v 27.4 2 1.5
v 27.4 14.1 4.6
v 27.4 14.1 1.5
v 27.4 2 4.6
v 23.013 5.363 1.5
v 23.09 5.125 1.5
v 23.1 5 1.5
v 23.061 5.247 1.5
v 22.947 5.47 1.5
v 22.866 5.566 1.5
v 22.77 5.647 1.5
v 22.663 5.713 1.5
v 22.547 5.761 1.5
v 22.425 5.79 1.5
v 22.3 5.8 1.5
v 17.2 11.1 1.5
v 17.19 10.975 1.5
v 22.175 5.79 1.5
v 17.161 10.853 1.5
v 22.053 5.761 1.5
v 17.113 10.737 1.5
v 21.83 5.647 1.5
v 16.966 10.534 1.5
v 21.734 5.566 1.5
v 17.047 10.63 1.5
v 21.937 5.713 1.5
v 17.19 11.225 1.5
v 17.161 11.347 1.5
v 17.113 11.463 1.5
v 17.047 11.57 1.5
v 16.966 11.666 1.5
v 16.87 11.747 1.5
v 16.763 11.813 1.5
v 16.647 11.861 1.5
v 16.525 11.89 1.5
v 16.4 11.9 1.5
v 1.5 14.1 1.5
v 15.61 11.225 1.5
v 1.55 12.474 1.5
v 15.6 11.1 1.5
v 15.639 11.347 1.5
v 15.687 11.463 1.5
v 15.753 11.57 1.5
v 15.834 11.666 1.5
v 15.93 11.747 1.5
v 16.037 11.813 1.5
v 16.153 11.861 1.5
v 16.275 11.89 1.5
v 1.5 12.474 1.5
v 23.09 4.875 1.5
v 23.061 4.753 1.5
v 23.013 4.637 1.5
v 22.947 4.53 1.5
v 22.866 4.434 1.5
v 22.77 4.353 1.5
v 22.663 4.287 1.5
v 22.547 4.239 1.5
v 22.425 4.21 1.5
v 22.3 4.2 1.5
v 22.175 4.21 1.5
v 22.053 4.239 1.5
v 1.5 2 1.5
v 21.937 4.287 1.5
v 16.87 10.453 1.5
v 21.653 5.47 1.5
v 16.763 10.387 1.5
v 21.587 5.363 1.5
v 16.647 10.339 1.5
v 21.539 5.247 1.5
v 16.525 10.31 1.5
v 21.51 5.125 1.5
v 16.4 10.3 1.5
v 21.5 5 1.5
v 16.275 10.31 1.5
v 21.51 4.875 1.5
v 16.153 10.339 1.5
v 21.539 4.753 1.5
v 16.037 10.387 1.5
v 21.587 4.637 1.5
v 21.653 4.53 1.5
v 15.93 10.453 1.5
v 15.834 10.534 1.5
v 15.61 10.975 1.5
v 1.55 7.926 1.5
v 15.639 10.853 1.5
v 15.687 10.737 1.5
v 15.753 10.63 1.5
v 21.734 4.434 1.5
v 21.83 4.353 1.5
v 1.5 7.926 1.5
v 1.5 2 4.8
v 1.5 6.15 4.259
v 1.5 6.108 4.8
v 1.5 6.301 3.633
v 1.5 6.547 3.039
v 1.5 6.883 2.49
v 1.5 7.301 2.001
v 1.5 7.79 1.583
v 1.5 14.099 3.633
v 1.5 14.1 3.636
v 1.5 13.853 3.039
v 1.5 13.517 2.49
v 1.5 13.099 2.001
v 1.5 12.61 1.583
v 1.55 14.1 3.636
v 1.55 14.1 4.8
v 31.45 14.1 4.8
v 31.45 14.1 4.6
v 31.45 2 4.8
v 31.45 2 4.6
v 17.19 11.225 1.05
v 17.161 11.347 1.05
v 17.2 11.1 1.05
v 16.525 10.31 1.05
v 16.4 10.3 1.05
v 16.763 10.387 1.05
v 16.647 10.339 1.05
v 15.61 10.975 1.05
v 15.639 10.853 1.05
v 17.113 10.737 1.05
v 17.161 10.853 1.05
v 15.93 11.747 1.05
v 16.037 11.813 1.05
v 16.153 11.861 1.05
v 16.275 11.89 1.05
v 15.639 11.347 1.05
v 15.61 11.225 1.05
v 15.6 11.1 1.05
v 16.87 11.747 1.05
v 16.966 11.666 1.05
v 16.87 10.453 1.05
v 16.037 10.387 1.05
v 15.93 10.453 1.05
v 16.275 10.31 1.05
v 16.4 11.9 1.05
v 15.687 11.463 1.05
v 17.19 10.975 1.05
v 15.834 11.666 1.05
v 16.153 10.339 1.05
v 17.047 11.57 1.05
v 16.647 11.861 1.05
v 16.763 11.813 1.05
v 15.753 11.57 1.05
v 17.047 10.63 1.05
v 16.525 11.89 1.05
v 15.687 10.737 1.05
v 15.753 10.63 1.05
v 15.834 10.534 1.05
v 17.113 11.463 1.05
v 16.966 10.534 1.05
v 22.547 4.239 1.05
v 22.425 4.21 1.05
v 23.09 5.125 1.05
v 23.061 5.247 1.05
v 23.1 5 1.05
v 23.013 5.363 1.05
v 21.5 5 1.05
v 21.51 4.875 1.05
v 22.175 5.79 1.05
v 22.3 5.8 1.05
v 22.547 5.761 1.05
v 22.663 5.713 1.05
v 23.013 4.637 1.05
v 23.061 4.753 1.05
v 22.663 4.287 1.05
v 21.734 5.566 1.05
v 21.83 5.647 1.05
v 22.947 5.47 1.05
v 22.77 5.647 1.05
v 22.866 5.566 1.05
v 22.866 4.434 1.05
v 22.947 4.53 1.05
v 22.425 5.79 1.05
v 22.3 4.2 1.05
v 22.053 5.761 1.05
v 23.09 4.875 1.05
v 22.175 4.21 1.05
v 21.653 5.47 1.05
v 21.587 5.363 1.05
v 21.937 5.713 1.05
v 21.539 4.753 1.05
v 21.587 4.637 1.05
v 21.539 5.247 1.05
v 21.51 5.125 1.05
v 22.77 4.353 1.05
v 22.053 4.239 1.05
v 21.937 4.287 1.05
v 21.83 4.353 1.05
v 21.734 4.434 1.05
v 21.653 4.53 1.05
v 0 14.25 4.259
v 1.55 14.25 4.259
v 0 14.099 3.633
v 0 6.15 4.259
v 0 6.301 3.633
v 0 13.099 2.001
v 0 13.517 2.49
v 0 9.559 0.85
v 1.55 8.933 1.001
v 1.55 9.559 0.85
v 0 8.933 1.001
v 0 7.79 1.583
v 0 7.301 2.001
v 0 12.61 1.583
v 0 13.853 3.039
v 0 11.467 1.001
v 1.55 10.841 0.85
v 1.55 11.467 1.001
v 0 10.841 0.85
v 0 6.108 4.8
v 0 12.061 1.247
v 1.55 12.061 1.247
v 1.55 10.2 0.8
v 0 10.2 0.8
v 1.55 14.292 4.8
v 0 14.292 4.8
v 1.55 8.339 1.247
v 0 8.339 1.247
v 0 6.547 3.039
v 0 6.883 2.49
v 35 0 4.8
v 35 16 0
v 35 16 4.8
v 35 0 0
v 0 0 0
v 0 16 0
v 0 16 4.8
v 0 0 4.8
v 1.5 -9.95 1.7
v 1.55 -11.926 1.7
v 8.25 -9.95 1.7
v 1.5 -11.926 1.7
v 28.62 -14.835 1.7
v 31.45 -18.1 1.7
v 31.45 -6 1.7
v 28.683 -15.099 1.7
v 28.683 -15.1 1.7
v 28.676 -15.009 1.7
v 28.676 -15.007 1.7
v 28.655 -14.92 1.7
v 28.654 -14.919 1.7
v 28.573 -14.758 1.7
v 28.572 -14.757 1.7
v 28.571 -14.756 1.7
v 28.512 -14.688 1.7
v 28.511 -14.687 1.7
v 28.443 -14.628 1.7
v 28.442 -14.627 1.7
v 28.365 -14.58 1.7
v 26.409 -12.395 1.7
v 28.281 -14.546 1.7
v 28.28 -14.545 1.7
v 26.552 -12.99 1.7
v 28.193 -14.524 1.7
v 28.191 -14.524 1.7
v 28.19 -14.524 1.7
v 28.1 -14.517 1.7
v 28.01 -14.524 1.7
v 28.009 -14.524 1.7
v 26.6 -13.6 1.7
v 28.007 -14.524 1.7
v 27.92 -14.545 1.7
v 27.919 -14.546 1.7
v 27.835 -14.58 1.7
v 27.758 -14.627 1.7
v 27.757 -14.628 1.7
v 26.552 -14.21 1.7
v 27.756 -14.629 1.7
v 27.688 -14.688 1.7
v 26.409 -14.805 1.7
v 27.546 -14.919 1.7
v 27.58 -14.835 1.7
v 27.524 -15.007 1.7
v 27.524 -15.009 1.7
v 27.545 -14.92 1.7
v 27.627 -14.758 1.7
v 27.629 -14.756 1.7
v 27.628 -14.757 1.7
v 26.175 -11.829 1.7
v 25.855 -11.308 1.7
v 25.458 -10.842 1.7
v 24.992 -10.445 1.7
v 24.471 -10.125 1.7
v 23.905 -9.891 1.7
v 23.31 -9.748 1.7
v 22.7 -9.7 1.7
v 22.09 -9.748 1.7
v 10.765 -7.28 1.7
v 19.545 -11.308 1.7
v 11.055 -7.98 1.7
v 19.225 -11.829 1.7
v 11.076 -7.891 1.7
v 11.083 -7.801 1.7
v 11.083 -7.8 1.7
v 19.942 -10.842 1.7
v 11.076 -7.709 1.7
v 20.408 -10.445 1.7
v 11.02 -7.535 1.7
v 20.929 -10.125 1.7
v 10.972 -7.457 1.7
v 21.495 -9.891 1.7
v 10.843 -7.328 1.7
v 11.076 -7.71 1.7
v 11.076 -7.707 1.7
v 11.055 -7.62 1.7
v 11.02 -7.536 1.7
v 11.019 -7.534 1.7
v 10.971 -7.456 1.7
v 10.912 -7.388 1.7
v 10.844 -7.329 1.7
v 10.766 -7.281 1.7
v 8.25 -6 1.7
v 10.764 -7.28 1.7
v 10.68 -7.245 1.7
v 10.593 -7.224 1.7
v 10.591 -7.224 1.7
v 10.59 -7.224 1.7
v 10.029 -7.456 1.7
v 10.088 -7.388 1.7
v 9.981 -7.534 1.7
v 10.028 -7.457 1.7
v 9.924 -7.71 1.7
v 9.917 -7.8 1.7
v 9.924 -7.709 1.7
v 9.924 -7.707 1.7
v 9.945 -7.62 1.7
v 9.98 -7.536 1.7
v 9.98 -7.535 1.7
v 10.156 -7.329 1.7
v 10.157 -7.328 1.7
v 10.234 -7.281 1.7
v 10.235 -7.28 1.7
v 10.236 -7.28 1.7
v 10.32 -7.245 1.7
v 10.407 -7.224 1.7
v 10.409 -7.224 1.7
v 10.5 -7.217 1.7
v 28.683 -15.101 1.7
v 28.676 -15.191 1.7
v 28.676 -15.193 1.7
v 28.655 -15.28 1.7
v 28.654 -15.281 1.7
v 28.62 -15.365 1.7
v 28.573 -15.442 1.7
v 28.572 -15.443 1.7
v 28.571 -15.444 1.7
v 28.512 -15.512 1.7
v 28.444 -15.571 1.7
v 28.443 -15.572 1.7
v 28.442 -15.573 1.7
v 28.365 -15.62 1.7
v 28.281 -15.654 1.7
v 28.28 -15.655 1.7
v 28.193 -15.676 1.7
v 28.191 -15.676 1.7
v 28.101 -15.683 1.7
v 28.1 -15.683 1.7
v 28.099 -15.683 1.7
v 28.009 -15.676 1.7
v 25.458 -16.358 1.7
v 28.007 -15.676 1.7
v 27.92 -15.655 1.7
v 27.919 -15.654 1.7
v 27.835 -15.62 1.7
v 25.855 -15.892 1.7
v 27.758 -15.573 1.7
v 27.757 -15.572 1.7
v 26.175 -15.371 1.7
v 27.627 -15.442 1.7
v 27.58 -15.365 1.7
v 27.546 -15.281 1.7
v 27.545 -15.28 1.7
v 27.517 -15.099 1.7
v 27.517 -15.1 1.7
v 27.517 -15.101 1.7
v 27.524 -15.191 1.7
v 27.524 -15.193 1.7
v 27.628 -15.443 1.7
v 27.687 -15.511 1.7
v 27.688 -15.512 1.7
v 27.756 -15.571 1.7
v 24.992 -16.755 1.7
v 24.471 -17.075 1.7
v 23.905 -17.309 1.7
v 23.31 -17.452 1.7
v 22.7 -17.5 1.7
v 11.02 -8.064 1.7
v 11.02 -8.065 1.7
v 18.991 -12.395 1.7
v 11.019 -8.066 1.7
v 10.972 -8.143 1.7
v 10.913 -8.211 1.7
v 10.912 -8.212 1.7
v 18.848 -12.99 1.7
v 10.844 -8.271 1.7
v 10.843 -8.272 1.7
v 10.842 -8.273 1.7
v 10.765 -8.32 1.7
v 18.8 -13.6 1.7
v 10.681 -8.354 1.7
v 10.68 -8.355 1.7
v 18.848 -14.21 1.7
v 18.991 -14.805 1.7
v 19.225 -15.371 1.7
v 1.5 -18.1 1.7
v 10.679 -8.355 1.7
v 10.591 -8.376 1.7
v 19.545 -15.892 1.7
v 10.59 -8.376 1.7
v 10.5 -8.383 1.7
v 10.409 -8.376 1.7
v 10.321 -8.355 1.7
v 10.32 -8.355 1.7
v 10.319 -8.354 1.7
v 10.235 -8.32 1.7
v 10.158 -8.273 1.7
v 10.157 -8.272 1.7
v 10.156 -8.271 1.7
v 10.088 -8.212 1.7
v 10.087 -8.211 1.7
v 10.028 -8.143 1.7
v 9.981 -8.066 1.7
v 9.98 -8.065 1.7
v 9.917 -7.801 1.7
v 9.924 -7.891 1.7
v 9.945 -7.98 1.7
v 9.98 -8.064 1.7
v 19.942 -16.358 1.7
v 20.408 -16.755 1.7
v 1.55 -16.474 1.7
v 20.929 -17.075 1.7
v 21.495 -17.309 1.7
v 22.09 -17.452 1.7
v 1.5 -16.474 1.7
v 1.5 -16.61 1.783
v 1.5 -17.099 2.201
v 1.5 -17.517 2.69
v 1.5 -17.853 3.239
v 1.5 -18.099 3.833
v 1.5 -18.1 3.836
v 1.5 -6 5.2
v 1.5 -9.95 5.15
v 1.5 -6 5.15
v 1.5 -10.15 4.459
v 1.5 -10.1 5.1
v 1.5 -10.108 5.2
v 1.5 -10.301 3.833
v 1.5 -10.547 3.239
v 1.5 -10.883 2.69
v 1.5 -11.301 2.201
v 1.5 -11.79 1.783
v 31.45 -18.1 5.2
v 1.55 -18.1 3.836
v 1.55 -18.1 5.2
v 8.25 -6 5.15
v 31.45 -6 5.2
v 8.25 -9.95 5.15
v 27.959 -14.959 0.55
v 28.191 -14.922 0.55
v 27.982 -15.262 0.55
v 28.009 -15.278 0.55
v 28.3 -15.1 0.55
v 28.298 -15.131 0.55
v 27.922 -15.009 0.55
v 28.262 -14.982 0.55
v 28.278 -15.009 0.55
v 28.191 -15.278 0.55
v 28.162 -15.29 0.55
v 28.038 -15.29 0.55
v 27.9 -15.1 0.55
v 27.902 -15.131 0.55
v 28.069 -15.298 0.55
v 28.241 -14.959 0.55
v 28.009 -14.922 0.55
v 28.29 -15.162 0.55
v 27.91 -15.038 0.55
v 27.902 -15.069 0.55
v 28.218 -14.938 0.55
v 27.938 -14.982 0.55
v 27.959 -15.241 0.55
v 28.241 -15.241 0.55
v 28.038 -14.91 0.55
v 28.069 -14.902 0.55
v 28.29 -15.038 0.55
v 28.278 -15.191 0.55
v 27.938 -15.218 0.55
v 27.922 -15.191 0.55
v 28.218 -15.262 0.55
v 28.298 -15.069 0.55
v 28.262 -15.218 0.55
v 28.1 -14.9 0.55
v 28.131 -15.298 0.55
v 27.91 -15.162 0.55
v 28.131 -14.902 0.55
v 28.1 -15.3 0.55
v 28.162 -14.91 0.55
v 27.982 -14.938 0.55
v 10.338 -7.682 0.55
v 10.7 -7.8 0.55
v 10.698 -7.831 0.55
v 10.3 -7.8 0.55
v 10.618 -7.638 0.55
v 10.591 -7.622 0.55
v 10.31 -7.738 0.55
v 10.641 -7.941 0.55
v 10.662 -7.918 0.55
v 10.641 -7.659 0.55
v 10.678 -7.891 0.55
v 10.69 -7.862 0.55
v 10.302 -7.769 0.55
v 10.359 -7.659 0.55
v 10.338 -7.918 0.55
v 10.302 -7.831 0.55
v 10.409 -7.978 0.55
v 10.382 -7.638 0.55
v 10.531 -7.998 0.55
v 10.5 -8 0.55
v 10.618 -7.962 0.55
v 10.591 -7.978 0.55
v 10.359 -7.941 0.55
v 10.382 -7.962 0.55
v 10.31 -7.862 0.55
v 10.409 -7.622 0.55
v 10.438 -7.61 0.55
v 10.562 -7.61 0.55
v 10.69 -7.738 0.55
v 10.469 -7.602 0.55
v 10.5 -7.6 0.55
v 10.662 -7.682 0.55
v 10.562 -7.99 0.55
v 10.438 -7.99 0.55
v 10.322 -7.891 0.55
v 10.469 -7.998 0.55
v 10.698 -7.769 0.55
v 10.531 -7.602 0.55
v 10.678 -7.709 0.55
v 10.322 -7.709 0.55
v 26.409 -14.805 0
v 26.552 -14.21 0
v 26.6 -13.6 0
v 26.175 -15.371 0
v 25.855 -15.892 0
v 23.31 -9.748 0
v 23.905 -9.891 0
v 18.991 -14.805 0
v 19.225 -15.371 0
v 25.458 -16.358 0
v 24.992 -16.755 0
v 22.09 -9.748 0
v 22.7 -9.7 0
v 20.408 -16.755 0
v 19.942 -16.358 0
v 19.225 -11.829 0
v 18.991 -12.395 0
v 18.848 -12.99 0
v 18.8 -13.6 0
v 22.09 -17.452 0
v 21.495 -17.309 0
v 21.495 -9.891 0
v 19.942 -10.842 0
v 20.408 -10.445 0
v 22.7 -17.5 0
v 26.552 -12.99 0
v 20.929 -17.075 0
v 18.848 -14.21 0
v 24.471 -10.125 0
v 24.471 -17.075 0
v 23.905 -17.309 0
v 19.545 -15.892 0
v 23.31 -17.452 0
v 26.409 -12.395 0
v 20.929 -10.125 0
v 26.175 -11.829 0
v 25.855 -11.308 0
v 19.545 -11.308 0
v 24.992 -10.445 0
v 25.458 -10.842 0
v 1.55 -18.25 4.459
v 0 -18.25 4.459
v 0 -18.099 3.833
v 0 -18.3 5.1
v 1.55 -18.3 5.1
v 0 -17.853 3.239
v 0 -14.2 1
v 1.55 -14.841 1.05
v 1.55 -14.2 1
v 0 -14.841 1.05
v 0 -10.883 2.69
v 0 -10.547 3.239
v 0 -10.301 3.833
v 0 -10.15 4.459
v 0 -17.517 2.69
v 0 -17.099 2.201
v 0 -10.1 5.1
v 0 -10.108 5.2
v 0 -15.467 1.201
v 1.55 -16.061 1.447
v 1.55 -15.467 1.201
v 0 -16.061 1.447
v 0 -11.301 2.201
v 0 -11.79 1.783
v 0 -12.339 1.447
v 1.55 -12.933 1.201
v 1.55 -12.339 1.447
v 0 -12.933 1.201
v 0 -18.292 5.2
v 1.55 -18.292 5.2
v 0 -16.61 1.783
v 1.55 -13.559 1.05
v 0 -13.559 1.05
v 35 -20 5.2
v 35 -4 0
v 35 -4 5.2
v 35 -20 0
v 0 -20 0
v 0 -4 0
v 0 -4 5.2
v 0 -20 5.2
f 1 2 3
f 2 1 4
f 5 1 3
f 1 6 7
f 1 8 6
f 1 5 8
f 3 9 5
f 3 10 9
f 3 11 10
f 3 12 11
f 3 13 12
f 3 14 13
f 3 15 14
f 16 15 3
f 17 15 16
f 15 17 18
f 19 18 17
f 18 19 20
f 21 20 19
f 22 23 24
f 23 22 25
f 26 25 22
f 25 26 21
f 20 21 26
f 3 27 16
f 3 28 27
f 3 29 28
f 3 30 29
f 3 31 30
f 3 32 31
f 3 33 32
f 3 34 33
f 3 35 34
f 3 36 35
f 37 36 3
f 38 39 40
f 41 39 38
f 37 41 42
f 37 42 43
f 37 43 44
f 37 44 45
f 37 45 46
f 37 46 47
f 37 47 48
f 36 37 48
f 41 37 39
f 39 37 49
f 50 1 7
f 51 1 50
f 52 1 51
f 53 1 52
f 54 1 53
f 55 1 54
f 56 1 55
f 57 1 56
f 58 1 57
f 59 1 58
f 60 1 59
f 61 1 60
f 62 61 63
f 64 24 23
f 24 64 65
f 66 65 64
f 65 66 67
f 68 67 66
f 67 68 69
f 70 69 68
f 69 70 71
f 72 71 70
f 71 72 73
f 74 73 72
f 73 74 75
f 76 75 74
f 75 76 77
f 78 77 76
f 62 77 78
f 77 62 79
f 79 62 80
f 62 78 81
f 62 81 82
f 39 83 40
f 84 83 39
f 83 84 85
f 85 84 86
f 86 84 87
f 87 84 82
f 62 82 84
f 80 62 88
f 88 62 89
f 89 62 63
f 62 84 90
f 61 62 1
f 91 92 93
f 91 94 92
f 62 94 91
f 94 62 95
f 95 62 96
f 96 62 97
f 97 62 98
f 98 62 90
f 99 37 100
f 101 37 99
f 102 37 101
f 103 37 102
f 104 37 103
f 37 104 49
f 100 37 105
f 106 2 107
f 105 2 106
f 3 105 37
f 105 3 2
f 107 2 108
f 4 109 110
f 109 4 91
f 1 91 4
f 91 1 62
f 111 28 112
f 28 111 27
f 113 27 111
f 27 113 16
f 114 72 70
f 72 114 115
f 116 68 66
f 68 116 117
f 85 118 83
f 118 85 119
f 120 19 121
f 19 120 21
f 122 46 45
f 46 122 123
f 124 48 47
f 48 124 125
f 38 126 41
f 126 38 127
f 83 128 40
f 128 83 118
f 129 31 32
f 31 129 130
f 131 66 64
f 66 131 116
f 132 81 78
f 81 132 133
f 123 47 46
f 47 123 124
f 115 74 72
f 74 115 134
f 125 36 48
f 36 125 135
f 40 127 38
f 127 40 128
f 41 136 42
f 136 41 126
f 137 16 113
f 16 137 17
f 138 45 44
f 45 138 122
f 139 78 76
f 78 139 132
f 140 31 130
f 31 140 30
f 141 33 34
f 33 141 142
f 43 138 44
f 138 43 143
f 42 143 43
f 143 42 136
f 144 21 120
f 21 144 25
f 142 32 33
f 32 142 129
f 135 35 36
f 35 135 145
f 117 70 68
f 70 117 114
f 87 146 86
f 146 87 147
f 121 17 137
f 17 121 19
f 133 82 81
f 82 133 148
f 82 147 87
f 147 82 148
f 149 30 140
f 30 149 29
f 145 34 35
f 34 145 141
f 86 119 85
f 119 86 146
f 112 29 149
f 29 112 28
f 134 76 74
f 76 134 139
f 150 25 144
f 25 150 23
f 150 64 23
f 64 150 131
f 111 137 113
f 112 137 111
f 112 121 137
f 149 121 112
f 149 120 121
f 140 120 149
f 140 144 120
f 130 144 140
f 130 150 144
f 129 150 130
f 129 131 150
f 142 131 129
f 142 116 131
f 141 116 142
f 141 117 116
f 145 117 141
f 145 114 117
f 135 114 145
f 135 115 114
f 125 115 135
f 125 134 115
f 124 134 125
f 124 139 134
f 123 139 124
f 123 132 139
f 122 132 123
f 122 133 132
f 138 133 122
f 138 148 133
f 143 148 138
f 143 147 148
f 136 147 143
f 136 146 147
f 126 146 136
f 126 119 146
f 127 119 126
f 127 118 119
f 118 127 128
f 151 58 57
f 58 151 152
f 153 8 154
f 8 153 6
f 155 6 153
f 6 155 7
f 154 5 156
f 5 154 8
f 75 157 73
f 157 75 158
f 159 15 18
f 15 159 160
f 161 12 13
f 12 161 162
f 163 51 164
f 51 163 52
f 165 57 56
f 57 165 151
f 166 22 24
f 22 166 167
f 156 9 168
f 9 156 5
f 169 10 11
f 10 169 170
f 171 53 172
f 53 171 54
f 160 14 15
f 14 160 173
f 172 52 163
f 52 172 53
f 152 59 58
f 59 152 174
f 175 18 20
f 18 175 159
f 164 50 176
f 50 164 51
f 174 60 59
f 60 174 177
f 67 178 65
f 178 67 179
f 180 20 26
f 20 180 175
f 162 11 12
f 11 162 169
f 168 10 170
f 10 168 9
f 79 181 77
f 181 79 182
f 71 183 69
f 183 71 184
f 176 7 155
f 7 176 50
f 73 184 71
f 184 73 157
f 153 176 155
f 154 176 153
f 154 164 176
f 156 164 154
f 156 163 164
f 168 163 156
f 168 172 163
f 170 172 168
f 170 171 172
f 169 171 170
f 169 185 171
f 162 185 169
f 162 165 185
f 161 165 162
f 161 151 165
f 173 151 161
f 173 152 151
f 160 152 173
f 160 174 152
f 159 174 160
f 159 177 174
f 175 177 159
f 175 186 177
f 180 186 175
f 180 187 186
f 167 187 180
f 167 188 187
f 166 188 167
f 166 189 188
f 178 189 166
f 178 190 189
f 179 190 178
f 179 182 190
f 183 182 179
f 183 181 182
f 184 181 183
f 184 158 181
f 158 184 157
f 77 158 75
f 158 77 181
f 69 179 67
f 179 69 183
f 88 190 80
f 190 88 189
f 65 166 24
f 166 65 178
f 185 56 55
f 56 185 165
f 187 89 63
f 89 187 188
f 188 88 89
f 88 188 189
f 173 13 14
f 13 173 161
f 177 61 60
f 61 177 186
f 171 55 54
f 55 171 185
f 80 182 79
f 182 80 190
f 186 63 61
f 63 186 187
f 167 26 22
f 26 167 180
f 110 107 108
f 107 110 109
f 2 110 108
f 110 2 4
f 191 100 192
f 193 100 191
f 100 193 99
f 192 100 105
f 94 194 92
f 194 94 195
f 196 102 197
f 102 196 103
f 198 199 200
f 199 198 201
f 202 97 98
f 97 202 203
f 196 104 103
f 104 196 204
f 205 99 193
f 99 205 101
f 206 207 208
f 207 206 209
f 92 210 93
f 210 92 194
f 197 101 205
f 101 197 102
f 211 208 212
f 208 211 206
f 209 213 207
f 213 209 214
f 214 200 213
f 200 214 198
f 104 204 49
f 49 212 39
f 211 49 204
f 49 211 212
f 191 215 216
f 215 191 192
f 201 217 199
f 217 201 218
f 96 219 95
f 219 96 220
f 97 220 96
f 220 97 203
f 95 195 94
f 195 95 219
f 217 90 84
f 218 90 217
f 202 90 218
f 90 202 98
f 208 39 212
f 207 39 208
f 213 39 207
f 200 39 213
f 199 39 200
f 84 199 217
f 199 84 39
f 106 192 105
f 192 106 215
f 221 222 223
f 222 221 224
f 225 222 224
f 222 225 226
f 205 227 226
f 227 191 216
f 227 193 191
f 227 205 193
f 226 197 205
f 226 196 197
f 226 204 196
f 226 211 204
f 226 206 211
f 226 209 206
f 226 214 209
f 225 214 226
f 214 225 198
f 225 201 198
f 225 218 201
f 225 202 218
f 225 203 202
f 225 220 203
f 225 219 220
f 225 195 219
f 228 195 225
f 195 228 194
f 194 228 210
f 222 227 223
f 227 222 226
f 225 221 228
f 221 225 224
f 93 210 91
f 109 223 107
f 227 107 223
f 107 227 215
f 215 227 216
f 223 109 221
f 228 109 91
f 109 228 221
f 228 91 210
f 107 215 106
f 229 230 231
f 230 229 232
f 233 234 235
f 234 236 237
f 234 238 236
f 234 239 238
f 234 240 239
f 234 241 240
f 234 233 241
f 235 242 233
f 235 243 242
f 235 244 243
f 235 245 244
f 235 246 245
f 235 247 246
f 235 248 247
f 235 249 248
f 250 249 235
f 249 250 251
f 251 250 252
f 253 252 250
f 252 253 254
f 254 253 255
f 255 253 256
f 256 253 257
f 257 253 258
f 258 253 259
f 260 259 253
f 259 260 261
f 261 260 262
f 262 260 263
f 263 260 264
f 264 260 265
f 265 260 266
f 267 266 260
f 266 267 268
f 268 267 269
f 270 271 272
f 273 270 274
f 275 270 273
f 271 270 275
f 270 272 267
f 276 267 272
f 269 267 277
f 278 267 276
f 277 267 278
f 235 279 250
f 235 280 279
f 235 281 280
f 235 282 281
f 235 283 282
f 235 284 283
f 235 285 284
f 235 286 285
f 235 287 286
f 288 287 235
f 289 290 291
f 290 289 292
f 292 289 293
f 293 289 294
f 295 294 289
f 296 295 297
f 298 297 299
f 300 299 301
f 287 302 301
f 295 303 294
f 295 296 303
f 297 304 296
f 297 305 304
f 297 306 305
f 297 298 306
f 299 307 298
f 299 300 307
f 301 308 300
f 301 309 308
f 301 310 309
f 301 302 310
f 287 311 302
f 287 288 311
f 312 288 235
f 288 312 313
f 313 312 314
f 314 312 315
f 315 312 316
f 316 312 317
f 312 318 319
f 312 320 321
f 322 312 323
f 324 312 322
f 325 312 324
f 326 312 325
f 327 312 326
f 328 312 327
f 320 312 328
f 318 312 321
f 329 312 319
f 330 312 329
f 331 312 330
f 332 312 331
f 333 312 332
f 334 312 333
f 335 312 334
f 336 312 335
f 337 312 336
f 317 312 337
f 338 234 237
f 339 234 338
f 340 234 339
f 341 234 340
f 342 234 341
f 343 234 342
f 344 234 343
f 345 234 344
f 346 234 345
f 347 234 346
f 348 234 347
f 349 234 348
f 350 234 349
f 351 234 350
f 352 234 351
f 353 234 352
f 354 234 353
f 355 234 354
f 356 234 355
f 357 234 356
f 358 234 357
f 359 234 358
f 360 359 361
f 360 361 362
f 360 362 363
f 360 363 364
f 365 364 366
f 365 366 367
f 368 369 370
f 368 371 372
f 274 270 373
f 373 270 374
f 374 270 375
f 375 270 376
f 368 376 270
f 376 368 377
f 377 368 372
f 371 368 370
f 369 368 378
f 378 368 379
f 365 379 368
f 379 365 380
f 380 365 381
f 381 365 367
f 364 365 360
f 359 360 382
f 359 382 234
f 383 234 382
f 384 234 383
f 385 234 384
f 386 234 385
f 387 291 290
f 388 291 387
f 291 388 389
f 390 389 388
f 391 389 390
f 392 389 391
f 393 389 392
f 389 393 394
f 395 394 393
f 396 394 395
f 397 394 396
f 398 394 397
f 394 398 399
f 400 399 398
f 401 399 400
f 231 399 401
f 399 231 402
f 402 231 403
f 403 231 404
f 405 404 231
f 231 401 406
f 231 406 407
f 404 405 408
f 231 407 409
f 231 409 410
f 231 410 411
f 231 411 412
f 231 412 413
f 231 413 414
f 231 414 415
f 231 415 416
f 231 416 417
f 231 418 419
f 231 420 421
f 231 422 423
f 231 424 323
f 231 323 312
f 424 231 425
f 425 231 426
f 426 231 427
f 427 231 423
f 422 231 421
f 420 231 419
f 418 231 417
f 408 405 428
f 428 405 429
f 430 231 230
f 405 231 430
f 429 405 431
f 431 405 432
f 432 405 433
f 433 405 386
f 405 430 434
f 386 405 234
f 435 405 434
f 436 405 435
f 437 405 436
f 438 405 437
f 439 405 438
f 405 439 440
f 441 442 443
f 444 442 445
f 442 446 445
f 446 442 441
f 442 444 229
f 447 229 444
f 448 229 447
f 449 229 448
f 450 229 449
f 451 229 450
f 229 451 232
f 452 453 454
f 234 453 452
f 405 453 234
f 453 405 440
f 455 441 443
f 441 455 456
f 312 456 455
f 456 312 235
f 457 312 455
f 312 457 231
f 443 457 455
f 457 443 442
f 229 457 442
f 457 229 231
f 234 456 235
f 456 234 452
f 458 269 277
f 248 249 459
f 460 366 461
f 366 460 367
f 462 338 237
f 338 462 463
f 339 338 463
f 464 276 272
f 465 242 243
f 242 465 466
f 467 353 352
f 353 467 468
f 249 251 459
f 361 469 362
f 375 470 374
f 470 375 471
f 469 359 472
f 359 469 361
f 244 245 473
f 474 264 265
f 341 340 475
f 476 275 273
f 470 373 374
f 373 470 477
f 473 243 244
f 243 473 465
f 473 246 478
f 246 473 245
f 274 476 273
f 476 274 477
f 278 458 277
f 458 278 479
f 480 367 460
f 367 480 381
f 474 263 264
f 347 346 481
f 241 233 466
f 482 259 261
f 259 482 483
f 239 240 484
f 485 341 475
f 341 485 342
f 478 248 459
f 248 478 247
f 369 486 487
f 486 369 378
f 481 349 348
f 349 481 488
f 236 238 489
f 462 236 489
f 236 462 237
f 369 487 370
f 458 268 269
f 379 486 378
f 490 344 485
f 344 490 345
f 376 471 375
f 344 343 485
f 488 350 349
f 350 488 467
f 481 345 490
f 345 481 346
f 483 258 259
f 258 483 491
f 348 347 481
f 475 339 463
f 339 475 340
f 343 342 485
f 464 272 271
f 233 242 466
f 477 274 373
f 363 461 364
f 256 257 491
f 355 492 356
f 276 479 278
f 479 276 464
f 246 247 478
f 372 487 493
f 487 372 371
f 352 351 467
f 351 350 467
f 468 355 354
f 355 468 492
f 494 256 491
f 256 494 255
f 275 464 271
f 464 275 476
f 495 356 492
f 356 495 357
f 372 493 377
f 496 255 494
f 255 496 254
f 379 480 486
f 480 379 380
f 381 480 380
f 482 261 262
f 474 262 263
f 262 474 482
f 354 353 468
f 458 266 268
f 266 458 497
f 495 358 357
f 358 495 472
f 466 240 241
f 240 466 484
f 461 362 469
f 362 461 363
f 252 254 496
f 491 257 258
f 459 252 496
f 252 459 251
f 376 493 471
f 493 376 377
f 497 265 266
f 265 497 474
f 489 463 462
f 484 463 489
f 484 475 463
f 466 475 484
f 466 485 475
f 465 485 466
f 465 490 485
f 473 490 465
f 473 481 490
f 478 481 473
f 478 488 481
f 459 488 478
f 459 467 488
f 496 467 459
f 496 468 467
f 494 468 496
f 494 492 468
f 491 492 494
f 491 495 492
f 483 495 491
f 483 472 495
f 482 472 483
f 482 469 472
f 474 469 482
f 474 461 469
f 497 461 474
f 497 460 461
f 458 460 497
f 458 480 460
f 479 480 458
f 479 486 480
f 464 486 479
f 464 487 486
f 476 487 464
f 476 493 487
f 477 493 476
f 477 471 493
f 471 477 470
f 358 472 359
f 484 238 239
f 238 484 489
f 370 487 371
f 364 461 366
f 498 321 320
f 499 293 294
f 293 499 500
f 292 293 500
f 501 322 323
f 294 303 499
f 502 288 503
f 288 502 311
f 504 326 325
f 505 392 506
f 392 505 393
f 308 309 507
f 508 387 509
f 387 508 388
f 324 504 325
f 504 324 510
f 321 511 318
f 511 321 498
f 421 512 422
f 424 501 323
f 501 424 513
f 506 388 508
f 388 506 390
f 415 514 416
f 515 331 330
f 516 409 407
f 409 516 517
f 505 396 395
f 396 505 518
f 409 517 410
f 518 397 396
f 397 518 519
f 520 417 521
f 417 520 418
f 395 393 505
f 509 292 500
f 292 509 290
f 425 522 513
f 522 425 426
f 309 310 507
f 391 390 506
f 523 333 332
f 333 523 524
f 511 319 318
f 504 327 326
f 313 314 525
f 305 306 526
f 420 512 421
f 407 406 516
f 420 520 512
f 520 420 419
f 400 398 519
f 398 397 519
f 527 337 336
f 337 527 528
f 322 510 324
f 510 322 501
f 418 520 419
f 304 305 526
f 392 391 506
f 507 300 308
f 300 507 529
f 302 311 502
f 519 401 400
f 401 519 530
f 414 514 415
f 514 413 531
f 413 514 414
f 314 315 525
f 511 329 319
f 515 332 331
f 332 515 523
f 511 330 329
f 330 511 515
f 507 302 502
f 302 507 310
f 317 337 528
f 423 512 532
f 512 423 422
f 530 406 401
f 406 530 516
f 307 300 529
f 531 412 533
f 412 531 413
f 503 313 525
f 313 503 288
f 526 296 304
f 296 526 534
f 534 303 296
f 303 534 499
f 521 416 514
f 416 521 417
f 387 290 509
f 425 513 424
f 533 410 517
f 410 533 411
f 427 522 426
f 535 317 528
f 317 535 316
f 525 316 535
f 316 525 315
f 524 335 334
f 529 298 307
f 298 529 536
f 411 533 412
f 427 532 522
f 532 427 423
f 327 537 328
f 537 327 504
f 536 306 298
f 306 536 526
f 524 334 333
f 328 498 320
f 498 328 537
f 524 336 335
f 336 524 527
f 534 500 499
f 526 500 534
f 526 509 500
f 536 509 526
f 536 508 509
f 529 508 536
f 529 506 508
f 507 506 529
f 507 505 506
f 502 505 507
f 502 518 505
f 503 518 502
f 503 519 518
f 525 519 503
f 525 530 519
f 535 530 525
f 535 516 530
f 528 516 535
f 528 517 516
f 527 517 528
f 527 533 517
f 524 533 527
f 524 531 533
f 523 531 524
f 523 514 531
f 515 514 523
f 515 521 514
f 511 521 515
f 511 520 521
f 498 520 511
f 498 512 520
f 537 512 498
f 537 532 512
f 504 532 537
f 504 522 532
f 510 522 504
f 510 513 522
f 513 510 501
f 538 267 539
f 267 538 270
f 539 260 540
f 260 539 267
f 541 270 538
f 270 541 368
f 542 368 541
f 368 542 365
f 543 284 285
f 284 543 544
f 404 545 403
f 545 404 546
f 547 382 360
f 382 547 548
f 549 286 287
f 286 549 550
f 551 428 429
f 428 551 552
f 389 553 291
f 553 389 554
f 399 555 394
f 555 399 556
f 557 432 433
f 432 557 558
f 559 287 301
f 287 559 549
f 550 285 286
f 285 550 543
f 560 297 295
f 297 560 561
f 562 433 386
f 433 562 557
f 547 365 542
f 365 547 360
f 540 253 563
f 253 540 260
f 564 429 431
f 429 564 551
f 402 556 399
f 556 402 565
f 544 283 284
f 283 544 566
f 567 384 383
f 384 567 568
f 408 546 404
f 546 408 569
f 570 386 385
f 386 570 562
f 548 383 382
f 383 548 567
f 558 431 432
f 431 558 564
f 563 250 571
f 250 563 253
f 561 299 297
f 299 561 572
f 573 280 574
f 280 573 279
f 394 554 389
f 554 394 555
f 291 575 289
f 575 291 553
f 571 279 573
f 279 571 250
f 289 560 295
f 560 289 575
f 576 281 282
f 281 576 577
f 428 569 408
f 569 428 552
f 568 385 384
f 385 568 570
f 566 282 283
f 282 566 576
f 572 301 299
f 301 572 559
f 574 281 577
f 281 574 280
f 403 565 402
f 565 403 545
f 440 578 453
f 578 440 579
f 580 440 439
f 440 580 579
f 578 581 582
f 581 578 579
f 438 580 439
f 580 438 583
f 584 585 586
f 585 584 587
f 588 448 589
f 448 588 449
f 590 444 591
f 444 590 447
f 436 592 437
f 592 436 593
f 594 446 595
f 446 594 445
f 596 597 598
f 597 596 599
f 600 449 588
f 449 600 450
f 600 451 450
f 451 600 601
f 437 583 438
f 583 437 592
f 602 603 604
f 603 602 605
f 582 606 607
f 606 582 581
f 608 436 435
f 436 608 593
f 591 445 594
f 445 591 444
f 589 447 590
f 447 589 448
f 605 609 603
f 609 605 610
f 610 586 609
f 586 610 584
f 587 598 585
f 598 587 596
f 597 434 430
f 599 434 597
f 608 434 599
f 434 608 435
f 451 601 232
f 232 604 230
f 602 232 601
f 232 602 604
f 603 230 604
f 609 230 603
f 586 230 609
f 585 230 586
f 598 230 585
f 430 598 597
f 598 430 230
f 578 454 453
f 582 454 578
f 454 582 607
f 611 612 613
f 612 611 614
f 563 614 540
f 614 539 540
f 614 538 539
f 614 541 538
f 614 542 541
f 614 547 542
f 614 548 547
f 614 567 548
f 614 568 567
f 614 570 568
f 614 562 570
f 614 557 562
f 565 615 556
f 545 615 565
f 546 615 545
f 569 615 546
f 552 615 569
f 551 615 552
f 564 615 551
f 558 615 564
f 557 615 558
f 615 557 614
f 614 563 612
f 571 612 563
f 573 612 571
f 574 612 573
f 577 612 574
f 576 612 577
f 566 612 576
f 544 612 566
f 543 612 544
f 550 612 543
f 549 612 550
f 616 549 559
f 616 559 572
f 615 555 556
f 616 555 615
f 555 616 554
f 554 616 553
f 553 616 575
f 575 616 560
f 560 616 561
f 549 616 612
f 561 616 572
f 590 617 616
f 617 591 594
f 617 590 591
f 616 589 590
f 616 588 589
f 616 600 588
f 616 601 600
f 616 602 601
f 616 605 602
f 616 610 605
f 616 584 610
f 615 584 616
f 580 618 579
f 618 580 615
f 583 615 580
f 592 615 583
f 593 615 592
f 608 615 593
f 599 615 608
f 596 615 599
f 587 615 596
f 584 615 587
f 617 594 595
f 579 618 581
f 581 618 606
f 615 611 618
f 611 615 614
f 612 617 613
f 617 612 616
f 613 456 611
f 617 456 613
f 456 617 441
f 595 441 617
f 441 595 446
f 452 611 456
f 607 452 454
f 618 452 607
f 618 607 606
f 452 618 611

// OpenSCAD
// TODO screw holes if wanted




// a tray where the hole made of the motor in 2 parts
exampleHoleTray();
//example that shows the motor inside an cube
//exampleMotorInCube();




module exampleHoleTray(){
	difference(){
		cube([35 , 16, 12]);
		translate([1.5,2,1.5]){
			miniMotor();
		}
		translate([-0.5,-0.5,4.8]){
			cube([40 , 17, 13]);
   	}
	}
	translate([0,-4,10])rotate([180,0,0]){
		difference(){
			cube([35 , 16, 10]);
			translate([1.5,2,1.5]){
				miniMotor();
			}
			translate([-0.5,-0.5,-8.2]){
				cube([40 , 17, 13]);
  	 		}
		}
	}
}

module exampleMotorInCube(){
	%cube([35 , 16, 12]);
	translate([1.5,2,1.5]){
			miniMotor(showMotorPart = true);
	}
	translate([0,-4,10])rotate([180,0,0]){
		%cube([35 , 16, 10]);
			translate([1.5,2,1.5]){
				miniMotor();
			}
	}
}


//RenderBottomPart = if you dont want the smalltabs on bottom
//								change to false
// showMotorPart = if you want to see the motor part change to true
//placeForWires = extra space for wires
// wireplaceWidth how long place for wires

module miniMotor(RenderBottomPart = true, showMotorPart = false, 
						placeForWires = true, wireplaceWidth = 3){


motorMagnify = 0.2;

// wjhitout flap
motorLenght = 25.7 + motorMagnify;
motorHeight = 6.6 + motorMagnify; 
motorWidth = 11.9 + motorMagnify;

// flap parts
flapThickness = 3.7;
flapLenght = 3.9 + motorMagnify;

// measurments for motorPart;
motorpartLenght = motorLenght - 14.7;
motorpartWidth = 8 + motorMagnify;

// measurments for the thin plastic area beside the motor
screwPlaceLenght = 6.8;
screwPlaceThickness = 3.1 + motorMagnify;

// screw hole info

screwPlacePos = 4.7;
screwPlacePos2 = 11.5;
screwPlacePos3 = 23.9;
screwFromSide = 1.8;
screwholeR = 1.8/2;


// measurment for the tabs at the top
tabOnTopPlace1 = motorLenght+0.7;
tabOnTopPlace1S = motorWidth-3.0;
tabOnTopPlace2 = 9;
tabOnTopPlace2S = 1.8;
tabOntopR = 1.2/2;
tabOnTopH = 1.2;


// measurments for the taps at the bottom
tabsAtBottomPlace1 = 14.9;
tabsAtBottomPlace1S = motorWidth-3;
tabsAtBottomPlace2 = 20.8;
tabsAtBottomPlace2S = 3; 
tabsAtBottomR = 1.6/2;
tabsAtBottomH = 0.5;

epsilon = 0.05;

// Shaft measurments
shaftR = 7.8/2;
shaftPos = 21.2;
shaftPosS = motorWidth-4.5;
shaftH = 2.5;




// make the motor
plasticPart();
if (showMotorPart){
	translate([epsilon ,motorpartWidth, motorHeight/2]){
			motorPart();
	}
}
if (placeForWires){
	placeForWires();
}




module placeForWires(){
	rotate([90,0,90])translate([motorpartWidth , motorHeight/2,
				-wireplaceWidth+epsilon ]){
			cylinder(wireplaceWidth,motorpartWidth/2, motorpartWidth/2, 
						$fn = 40);
		}
}


module plasticPart(){
	difference(){
		cube([motorLenght, motorWidth, motorHeight]);
		if (showMotorPart){
			translate([-epsilon, motorWidth- motorpartWidth,-epsilon/2]){
				// place for motorPart
				cube([motorpartLenght+epsilon , motorpartWidth+ epsilon,
					 motorHeight+ epsilon]);
			}
	    }
		// screwPlace beside motor 
		translate([-epsilon,-epsilon, screwPlaceThickness+ epsilon]){
			cube([screwPlaceLenght , motorWidth -motorpartWidth+ 2*epsilon, 
				motorHeight - screwPlaceThickness]);
		}
		
	}
	// flap
	translate([motorLenght-epsilon,0,motorHeight - flapThickness]){
		cube([flapLenght , motorWidth, flapThickness]);
	
	}
	// Tabs on top 
	translate([tabOnTopPlace1 ,tabOnTopPlace1S, motorHeight-epsilon]){
		cylinder(tabOnTopH,tabOntopR, tabOntopR/3, 
						$fn = 40);
	}
	translate([tabOnTopPlace2 ,tabOnTopPlace2S, motorHeight- epsilon]){
		cylinder(tabOnTopH,tabOntopR, tabOntopR/3, 
						$fn = 40);
	}
	//shaft
		translate([shaftPos ,shaftPosS, motorHeight-epsilon]){
			cylinder(shaftH ,shaftR , shaftR , 
						$fn = 40);
		}

	if (RenderBottomPart){
	// Tabs AtBottom
		translate([tabsAtBottomPlace1 ,tabsAtBottomPlace1S,
					 -tabsAtBottomH+epsilon]){
			cylinder(tabsAtBottomH,tabsAtBottomR , tabsAtBottomR , 
						$fn = 40);
		}
		translate([tabsAtBottomPlace2 ,tabsAtBottomPlace2S,
						 -tabsAtBottomH+ epsilon]){
			cylinder(tabsAtBottomH,tabsAtBottomR , tabsAtBottomR , 
						$fn = 40);
		}
	}
}


// motor part
module motorPart(){
if (showMotorPart)
	intersection(){
		rotate([90,0,90])translate([0,0, 0]){
			cylinder(motorpartLenght,motorpartWidth/2, motorpartWidth/2, 
						$fn = 40);
		}
		translate([0, -motorpartWidth/2, -motorHeight/2]){	
			cube([motorpartLenght+ epsilon, motorpartWidth, motorHeight]);
		}
	}
}
}
